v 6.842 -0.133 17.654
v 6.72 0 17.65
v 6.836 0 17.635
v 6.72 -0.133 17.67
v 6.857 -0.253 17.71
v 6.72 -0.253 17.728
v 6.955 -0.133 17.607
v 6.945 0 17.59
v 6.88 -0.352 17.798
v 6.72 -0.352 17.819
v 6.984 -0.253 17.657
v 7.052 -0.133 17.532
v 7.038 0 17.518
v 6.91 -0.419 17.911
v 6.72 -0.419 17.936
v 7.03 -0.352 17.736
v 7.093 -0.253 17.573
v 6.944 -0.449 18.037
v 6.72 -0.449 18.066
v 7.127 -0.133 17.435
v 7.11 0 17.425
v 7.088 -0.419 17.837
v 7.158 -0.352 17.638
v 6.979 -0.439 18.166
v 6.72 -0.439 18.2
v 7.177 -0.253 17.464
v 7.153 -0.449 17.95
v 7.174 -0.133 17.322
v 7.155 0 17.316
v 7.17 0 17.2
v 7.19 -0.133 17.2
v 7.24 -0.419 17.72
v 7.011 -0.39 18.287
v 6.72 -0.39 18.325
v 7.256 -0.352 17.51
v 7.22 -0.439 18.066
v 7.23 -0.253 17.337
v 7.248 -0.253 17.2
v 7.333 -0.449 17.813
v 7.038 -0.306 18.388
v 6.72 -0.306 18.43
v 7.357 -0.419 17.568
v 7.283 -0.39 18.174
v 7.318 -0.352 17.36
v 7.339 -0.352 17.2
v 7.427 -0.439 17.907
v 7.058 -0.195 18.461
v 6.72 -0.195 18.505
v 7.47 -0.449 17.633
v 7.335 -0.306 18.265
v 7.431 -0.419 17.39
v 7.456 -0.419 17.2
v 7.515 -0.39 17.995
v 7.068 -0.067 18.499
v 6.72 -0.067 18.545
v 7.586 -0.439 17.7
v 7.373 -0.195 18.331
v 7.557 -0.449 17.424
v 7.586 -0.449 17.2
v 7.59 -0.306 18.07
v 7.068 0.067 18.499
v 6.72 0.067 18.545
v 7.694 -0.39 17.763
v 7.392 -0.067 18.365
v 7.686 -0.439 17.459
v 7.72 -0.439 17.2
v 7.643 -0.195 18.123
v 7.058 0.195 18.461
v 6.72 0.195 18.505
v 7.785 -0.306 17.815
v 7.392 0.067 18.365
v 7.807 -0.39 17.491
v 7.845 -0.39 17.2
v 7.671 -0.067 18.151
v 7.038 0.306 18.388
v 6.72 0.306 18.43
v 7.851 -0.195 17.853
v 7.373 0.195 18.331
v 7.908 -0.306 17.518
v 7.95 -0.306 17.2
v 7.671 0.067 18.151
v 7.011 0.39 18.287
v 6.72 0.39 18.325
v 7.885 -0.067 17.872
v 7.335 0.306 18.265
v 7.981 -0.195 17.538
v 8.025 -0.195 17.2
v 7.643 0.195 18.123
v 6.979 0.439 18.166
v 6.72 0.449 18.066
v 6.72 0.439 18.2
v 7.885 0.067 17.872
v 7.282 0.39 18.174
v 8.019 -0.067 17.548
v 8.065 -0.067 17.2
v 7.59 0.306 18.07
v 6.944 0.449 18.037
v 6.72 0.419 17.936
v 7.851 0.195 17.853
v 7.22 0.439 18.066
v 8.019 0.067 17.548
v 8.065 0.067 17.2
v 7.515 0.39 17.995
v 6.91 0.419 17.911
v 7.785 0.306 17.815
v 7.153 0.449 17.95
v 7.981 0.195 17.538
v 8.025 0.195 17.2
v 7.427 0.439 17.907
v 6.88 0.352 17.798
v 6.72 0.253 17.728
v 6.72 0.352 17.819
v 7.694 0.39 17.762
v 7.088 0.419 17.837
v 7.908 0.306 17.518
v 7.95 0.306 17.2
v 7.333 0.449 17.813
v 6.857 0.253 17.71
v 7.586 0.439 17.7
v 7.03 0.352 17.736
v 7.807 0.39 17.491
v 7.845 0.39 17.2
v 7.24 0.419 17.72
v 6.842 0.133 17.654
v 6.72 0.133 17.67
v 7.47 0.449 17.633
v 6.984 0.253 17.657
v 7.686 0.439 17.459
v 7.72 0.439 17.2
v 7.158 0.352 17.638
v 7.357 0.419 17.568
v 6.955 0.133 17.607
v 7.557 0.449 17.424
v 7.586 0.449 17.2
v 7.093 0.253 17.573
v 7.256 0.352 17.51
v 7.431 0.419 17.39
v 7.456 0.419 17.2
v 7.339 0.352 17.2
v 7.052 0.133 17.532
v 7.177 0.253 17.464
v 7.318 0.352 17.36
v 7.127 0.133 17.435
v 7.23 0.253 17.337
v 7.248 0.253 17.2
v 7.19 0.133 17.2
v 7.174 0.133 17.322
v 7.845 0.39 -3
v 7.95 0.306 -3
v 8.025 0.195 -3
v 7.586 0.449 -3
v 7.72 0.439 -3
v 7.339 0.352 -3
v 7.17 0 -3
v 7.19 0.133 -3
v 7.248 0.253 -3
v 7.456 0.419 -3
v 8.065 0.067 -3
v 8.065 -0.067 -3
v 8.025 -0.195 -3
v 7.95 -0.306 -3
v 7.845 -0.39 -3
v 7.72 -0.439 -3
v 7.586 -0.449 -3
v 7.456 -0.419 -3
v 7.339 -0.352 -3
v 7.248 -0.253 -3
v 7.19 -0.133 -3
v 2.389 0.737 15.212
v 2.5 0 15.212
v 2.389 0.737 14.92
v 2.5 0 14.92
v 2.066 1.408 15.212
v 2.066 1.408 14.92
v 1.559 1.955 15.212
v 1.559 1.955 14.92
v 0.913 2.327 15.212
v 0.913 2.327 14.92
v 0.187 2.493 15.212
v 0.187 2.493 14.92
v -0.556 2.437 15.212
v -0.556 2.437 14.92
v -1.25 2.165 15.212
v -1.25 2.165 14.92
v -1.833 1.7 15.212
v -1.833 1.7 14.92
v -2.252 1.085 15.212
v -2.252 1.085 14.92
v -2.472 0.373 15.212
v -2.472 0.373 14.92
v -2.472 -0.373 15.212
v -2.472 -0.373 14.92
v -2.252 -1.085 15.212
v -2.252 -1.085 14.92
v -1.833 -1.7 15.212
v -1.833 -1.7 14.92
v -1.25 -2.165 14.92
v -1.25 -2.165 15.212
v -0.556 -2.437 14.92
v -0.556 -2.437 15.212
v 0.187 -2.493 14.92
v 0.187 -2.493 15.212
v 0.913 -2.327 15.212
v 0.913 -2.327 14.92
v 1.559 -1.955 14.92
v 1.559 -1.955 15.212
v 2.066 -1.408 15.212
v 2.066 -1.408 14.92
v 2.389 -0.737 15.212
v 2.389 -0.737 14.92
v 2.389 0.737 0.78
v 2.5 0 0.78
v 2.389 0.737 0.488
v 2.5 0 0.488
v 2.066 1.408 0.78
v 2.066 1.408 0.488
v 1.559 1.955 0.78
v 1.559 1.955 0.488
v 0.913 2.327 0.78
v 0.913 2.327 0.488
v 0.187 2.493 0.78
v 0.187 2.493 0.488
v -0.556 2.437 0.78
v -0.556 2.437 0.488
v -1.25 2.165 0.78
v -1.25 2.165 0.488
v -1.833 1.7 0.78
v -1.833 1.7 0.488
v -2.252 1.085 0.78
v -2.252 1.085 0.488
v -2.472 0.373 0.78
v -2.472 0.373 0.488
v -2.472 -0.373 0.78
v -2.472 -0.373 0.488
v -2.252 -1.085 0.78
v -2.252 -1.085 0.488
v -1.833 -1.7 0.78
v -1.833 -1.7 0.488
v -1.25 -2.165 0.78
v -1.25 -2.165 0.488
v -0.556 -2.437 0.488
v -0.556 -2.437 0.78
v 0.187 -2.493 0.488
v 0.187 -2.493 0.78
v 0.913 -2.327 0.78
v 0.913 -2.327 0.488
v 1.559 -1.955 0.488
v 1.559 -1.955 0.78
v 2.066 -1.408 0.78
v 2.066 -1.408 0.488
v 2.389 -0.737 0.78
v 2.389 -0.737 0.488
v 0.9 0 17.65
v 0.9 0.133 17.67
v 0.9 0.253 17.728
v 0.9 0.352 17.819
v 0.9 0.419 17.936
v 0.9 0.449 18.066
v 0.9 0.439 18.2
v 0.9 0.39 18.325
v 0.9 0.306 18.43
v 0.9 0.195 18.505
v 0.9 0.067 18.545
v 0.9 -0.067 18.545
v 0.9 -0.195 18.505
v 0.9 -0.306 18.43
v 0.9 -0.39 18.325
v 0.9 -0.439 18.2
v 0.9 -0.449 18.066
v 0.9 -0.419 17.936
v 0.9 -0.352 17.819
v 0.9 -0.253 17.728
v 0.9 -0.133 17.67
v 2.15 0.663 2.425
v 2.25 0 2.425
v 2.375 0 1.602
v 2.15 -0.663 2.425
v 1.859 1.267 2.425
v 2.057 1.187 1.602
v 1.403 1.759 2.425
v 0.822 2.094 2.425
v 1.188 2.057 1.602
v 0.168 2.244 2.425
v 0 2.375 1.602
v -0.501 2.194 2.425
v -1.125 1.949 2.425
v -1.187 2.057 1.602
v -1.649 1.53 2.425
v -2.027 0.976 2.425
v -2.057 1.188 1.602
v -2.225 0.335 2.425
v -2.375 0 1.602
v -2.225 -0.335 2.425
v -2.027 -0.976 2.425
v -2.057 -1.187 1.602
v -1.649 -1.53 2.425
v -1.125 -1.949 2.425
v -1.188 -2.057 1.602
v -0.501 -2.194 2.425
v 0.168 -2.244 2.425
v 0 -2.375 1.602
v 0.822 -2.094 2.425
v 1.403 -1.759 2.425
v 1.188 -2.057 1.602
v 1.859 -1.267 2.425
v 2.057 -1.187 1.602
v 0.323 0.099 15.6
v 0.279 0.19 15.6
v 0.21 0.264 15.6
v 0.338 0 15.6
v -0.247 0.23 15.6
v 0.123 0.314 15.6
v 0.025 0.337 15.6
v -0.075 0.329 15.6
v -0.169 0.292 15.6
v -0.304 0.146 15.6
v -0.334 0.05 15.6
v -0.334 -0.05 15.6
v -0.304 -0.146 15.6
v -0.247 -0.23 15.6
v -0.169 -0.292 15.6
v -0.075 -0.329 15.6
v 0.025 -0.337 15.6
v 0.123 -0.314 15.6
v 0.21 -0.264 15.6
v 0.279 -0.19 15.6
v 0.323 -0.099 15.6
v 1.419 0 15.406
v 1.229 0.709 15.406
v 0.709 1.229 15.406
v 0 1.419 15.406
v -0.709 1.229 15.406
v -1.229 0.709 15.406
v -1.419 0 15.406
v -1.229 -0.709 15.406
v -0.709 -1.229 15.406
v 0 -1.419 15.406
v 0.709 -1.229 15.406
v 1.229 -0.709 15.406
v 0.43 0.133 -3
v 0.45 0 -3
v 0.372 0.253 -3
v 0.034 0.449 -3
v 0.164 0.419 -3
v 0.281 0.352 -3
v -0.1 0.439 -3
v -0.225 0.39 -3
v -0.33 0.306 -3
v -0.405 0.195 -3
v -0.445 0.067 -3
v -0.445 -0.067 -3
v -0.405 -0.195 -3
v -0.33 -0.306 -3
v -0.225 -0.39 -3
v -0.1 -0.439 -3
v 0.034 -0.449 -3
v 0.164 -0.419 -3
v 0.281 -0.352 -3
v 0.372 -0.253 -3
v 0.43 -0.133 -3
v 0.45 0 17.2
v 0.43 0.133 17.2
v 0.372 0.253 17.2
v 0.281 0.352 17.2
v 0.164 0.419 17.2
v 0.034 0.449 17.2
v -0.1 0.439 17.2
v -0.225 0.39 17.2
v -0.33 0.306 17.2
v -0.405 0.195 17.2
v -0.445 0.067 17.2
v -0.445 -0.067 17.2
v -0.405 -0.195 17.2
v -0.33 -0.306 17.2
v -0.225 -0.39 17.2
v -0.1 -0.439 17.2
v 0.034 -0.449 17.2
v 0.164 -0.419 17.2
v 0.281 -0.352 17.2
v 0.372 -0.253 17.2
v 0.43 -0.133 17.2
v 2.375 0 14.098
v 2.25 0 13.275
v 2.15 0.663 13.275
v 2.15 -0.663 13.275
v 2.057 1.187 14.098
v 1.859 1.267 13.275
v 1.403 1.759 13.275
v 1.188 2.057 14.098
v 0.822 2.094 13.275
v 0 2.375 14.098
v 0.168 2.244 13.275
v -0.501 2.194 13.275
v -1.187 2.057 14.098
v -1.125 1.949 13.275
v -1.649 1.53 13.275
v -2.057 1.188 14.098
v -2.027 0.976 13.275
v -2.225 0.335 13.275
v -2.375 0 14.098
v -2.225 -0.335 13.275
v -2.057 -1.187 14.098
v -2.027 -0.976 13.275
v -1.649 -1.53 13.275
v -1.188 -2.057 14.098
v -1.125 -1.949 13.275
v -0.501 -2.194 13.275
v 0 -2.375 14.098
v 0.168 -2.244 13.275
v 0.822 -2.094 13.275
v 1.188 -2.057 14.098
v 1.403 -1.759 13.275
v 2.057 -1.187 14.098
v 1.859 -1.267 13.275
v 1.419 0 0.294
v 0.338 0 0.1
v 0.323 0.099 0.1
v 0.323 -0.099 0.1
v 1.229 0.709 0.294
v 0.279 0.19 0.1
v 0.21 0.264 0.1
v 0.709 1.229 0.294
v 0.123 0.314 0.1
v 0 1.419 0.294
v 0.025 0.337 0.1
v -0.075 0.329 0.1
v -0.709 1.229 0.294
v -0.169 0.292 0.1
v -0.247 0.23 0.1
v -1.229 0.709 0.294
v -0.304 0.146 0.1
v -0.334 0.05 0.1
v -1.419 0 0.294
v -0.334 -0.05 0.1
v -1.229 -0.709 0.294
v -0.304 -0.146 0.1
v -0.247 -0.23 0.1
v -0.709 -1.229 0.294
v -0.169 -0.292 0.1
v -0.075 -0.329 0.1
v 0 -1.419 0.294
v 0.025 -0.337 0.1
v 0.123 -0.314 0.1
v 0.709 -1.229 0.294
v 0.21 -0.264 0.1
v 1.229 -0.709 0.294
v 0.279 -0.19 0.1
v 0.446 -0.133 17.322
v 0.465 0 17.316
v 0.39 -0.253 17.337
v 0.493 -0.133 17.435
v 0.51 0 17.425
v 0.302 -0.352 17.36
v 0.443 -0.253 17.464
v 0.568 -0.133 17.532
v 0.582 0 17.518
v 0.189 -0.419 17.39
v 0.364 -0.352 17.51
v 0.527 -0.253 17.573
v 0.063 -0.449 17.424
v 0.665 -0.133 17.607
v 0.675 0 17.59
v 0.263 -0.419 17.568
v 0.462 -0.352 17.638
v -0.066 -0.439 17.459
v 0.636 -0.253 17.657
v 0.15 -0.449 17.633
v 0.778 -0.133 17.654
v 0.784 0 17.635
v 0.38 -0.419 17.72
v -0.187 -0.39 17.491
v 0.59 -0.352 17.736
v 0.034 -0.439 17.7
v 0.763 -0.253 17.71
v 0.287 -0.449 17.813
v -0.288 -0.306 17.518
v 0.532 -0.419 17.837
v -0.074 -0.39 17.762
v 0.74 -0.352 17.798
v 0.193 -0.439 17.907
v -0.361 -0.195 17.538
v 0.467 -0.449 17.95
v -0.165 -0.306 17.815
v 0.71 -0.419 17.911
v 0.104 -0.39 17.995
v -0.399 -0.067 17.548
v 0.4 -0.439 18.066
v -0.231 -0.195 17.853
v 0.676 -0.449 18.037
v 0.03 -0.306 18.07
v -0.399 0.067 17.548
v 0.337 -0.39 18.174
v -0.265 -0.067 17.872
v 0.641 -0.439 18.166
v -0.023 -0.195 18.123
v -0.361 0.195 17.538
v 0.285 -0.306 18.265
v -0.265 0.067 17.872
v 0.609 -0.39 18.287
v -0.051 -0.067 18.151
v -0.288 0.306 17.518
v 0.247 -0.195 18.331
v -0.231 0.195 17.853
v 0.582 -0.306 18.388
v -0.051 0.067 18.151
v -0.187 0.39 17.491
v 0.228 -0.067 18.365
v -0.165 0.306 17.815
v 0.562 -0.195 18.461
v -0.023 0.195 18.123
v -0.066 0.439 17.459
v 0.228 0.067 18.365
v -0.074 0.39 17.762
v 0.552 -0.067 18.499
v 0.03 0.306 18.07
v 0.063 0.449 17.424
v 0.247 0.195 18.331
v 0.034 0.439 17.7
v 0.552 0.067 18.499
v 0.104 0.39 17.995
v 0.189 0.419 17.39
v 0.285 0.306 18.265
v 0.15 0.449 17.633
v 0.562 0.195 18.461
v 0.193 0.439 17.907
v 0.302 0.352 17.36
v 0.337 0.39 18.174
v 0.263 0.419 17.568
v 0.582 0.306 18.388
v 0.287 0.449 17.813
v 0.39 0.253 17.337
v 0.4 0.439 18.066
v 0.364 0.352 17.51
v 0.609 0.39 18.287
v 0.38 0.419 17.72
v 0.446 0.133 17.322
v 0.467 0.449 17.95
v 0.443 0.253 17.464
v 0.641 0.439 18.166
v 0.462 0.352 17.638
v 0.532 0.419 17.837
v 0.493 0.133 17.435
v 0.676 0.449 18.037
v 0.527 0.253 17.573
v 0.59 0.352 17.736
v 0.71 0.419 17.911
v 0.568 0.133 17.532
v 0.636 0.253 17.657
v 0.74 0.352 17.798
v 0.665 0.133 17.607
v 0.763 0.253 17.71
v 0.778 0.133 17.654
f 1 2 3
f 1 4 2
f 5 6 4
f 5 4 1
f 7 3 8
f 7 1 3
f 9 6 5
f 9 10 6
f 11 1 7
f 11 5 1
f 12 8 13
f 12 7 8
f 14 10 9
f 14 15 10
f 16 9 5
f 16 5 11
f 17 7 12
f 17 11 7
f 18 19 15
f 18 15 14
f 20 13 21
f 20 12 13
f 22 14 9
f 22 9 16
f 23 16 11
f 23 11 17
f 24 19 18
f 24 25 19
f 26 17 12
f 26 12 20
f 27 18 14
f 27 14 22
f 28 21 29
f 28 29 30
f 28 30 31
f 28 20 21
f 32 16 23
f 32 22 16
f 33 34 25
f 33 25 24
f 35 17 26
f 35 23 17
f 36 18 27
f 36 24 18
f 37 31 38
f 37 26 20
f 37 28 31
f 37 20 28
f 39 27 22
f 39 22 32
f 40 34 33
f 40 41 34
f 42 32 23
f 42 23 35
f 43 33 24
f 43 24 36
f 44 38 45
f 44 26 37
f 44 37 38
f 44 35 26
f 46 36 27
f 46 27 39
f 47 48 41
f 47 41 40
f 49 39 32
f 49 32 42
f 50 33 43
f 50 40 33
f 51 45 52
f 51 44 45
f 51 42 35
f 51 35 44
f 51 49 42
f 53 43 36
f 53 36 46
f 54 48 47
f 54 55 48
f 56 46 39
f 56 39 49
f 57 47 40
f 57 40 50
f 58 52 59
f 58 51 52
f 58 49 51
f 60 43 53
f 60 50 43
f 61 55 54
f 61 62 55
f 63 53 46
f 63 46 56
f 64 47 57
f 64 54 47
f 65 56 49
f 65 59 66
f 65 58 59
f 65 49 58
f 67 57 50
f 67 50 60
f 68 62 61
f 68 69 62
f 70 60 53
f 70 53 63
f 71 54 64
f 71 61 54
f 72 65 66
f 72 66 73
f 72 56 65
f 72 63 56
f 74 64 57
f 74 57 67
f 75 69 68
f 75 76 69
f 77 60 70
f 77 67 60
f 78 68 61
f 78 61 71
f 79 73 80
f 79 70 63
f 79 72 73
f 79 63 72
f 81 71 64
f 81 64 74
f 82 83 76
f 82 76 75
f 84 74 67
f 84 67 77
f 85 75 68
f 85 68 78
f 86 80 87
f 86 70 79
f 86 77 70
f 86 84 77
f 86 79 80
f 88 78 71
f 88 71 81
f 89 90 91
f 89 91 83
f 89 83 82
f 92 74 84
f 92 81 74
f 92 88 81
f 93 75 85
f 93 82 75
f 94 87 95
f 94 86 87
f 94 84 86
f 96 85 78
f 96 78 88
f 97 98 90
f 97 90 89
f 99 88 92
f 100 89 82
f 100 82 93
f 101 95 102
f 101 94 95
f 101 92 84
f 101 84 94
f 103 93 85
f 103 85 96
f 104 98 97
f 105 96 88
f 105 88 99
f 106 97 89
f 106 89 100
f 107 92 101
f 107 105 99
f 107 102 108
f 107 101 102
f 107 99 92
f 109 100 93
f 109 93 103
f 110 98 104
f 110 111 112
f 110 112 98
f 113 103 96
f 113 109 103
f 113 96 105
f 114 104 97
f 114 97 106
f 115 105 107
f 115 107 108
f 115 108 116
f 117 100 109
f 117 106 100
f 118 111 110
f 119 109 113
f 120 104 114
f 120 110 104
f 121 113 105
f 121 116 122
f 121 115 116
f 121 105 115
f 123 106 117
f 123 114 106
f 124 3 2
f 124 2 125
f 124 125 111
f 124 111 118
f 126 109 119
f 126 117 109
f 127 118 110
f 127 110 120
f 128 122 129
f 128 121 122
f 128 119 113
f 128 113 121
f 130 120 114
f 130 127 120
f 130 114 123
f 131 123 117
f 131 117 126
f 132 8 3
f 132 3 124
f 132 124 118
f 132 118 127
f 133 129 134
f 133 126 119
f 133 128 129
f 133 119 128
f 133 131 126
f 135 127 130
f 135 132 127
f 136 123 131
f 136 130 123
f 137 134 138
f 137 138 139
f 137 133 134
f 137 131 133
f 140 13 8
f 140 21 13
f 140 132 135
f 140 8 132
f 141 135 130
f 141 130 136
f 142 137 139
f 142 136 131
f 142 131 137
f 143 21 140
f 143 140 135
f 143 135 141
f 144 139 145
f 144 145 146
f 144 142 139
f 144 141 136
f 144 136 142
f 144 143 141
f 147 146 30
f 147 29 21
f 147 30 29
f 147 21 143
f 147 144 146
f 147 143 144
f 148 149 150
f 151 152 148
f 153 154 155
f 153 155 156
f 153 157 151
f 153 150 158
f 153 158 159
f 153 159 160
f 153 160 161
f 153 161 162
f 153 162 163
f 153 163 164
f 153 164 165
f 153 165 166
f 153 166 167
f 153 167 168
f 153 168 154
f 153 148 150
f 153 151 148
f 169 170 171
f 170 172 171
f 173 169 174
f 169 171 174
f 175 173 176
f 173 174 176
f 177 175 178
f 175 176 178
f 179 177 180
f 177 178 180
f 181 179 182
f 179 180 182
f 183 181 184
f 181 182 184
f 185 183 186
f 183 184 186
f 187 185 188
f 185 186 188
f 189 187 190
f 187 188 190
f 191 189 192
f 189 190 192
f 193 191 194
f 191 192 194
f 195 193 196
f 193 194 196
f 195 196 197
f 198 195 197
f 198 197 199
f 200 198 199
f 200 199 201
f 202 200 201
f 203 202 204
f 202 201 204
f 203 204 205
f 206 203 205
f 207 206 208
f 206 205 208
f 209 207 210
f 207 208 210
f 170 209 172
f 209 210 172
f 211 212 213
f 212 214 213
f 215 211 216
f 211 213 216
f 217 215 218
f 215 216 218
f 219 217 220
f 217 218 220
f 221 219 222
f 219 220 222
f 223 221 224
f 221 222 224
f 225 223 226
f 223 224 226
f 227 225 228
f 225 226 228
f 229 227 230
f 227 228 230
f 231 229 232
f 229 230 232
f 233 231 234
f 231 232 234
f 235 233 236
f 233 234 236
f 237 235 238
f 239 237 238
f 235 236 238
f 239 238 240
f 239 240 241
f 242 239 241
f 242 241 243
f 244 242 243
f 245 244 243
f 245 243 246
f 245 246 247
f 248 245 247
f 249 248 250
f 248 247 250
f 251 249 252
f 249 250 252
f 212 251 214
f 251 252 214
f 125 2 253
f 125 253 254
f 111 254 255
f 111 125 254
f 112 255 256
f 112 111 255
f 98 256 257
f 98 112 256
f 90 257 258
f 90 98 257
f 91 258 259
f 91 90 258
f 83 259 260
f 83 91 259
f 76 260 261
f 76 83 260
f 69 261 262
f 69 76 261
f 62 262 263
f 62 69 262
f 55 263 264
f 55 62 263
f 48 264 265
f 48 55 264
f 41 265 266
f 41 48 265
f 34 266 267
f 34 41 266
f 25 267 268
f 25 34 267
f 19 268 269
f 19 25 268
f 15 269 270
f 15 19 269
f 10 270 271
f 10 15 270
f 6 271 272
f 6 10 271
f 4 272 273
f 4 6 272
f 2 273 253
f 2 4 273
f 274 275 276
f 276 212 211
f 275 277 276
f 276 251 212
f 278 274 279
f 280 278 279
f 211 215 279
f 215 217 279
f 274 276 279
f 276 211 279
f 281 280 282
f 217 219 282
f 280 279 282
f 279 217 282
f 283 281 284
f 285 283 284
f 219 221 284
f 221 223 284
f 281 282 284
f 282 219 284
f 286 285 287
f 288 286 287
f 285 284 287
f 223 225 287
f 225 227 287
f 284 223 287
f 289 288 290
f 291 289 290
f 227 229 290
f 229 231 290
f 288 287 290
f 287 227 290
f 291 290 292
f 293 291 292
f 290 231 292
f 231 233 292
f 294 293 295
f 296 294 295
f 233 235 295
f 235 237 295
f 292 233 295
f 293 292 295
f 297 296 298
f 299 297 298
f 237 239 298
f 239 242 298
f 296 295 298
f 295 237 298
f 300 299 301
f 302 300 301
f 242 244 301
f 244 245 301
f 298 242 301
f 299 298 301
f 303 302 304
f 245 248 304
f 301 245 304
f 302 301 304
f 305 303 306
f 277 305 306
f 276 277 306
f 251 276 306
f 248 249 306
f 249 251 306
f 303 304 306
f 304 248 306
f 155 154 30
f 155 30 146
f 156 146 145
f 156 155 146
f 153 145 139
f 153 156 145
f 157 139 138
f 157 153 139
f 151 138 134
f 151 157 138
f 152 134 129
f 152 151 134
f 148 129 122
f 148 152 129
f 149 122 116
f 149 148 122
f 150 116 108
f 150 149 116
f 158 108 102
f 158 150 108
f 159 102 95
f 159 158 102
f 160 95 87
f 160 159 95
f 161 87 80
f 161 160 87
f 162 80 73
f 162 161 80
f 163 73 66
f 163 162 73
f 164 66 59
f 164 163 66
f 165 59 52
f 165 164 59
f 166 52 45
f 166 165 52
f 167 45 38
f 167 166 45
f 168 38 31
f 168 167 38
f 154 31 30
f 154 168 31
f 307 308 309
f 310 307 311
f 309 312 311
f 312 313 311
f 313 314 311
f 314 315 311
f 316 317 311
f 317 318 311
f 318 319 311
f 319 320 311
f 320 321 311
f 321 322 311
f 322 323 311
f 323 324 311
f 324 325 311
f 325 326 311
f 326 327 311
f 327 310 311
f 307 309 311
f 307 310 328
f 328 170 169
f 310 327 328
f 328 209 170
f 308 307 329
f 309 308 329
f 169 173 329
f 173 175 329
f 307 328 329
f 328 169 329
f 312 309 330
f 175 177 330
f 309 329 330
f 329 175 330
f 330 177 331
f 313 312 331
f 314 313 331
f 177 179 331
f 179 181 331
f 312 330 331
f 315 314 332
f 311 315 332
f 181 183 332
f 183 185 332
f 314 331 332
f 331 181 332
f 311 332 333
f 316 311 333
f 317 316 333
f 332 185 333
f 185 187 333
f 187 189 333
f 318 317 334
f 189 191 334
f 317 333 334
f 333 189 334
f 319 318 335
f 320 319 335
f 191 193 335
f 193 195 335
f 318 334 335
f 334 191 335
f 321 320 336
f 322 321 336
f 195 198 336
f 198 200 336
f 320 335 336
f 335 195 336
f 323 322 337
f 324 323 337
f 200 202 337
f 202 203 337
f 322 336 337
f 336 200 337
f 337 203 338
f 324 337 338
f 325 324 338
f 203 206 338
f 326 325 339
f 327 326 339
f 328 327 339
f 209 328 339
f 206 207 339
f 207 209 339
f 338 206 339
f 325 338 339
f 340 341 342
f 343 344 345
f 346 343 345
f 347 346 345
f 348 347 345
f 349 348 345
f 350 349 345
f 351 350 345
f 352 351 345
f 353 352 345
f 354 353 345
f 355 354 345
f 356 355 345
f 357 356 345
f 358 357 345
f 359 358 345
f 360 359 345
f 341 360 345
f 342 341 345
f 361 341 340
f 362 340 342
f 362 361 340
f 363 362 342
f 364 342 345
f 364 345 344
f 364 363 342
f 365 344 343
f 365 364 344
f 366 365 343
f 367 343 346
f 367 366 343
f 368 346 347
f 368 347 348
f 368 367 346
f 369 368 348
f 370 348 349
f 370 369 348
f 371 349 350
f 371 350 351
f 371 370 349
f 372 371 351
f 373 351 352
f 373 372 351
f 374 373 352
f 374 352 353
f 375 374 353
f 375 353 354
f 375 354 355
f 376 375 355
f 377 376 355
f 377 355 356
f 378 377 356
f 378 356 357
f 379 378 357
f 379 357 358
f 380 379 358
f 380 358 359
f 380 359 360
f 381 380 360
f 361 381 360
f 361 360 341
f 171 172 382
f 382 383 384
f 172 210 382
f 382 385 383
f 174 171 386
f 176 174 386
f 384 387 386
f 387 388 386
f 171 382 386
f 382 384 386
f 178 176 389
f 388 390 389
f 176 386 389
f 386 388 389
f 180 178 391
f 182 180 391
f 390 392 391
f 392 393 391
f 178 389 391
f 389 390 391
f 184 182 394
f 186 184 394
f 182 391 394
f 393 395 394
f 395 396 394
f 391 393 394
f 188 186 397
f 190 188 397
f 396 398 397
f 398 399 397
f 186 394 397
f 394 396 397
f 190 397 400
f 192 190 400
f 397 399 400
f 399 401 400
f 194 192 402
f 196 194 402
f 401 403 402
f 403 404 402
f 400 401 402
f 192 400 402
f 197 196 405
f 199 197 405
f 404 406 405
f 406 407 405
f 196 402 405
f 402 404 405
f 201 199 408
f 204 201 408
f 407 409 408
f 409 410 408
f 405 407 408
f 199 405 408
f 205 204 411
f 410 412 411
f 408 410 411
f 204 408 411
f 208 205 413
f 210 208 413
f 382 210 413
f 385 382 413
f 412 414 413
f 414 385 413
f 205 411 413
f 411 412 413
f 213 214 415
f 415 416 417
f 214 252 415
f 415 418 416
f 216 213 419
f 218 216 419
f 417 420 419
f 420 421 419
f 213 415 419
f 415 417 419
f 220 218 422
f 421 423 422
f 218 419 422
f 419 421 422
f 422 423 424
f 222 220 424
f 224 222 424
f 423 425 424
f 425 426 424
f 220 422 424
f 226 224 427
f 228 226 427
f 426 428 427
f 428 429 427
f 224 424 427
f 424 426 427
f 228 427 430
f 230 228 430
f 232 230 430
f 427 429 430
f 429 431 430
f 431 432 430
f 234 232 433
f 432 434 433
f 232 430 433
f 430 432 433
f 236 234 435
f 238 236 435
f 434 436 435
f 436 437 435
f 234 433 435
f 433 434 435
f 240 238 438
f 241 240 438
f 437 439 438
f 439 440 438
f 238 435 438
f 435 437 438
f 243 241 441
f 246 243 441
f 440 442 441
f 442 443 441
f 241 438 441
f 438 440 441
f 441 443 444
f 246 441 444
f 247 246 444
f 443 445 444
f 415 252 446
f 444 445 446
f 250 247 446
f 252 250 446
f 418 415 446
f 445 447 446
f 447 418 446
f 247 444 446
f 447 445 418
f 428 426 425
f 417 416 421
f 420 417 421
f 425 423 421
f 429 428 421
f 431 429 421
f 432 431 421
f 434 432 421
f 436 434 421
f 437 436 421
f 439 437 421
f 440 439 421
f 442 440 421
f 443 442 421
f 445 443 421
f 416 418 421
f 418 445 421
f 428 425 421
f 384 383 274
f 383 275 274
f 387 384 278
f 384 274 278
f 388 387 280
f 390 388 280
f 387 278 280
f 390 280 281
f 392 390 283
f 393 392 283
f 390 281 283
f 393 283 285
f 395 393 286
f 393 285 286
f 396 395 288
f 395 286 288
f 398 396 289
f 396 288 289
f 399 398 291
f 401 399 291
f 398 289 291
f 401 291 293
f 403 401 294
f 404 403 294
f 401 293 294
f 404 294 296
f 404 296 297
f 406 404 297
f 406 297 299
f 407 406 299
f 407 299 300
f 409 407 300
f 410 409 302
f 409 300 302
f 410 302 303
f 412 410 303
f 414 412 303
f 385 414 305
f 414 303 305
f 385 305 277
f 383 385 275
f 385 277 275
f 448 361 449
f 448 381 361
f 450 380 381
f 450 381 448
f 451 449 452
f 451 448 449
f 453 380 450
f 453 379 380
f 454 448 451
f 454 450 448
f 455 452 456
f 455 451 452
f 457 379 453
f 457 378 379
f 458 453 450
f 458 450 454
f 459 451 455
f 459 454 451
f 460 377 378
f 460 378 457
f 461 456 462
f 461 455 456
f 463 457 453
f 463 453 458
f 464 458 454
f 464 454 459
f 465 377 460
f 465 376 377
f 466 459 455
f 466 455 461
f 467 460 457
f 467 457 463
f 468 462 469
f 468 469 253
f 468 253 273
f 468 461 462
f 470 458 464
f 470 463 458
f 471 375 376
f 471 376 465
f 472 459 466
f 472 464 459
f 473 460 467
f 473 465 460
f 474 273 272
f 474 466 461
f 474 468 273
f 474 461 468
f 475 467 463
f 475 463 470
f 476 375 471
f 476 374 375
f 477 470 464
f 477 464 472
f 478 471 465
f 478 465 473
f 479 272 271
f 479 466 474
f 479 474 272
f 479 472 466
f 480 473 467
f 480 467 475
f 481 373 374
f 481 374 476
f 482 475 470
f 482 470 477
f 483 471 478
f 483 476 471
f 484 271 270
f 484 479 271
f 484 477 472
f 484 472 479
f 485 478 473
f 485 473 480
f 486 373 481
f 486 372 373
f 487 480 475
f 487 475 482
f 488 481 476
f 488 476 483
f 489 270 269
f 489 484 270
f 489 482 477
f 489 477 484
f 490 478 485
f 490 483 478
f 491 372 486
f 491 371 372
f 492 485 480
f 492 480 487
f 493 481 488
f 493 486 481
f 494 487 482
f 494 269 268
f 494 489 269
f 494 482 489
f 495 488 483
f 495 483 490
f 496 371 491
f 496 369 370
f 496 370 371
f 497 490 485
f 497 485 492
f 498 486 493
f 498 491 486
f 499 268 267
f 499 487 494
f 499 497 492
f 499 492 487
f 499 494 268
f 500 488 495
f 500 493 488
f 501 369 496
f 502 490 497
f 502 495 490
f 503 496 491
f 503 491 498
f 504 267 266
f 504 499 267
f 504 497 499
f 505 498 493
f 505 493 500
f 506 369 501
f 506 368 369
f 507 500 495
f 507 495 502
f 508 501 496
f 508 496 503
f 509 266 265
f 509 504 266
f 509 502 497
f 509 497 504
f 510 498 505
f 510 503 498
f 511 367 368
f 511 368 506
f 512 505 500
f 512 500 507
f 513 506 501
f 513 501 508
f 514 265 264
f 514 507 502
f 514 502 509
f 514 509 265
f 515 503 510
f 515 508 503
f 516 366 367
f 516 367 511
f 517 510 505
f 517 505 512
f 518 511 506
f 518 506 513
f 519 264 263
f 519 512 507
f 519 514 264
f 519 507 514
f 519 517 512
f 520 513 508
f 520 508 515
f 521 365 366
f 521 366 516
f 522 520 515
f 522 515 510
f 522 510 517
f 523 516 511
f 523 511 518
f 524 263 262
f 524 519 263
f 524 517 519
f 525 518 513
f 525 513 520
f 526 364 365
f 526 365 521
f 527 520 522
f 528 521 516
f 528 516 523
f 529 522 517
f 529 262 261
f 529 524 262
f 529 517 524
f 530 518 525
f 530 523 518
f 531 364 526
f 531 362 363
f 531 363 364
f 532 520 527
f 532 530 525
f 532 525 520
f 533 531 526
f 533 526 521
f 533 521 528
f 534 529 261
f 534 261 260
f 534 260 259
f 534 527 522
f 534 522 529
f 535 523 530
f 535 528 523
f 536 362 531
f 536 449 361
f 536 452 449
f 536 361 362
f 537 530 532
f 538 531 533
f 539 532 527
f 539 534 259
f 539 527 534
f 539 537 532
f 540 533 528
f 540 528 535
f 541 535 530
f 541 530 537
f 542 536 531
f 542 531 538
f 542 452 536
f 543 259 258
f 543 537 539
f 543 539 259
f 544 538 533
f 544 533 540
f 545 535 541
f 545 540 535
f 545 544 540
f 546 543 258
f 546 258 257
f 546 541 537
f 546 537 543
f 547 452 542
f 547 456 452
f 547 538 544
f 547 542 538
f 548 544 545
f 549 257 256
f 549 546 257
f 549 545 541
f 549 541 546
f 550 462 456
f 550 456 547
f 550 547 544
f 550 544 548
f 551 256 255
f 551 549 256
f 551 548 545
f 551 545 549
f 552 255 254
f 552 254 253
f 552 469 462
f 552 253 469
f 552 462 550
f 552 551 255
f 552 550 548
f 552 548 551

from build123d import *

# Parameters (mm, degrees)
SKETCH_R = 0.45


with BuildPart() as sweep_body:
    # Sweep: sweep along a path in Sketch001
    with BuildLine(Plane.XZ) as sweep_path:
        Line((0, -3), (0, 17.2))
        ThreePointArc((0, 17.2), (0.2636, 17.836392), (0.899988, 18.1))
        Line((0.899988, 18.1), (6.72, 18.1))
        ThreePointArc((6.72, 18.1), (7.356396, 17.836396), (7.62, 17.2))
        Line((7.62, 17.2), (7.62, -3))
    # Sketch → Sweep (sweep)
    with BuildSketch(Plane.XY.offset(-2)):
        Circle(SKETCH_R)
    sweep(path=sweep_path.line)


with BuildPart() as revolution:
    # Sketch002 → Revolution (revolve)
    with BuildSketch(Plane.XZ):
        Polygon((0, 0.1), (0, 15.6), (0.3375, 15.6), (2.5, 15.2125), (2.5, 14.92), (2.25, 13.275), (2.25, 2.425), (2.5, 0.78), (2.5, 0.4875), (0.3375, 0.1), align=None)
    revolve(axis=Axis((0, 0, 0), (0, 0, 1)))


solid = Compound([sweep_body.part, revolution.part])
